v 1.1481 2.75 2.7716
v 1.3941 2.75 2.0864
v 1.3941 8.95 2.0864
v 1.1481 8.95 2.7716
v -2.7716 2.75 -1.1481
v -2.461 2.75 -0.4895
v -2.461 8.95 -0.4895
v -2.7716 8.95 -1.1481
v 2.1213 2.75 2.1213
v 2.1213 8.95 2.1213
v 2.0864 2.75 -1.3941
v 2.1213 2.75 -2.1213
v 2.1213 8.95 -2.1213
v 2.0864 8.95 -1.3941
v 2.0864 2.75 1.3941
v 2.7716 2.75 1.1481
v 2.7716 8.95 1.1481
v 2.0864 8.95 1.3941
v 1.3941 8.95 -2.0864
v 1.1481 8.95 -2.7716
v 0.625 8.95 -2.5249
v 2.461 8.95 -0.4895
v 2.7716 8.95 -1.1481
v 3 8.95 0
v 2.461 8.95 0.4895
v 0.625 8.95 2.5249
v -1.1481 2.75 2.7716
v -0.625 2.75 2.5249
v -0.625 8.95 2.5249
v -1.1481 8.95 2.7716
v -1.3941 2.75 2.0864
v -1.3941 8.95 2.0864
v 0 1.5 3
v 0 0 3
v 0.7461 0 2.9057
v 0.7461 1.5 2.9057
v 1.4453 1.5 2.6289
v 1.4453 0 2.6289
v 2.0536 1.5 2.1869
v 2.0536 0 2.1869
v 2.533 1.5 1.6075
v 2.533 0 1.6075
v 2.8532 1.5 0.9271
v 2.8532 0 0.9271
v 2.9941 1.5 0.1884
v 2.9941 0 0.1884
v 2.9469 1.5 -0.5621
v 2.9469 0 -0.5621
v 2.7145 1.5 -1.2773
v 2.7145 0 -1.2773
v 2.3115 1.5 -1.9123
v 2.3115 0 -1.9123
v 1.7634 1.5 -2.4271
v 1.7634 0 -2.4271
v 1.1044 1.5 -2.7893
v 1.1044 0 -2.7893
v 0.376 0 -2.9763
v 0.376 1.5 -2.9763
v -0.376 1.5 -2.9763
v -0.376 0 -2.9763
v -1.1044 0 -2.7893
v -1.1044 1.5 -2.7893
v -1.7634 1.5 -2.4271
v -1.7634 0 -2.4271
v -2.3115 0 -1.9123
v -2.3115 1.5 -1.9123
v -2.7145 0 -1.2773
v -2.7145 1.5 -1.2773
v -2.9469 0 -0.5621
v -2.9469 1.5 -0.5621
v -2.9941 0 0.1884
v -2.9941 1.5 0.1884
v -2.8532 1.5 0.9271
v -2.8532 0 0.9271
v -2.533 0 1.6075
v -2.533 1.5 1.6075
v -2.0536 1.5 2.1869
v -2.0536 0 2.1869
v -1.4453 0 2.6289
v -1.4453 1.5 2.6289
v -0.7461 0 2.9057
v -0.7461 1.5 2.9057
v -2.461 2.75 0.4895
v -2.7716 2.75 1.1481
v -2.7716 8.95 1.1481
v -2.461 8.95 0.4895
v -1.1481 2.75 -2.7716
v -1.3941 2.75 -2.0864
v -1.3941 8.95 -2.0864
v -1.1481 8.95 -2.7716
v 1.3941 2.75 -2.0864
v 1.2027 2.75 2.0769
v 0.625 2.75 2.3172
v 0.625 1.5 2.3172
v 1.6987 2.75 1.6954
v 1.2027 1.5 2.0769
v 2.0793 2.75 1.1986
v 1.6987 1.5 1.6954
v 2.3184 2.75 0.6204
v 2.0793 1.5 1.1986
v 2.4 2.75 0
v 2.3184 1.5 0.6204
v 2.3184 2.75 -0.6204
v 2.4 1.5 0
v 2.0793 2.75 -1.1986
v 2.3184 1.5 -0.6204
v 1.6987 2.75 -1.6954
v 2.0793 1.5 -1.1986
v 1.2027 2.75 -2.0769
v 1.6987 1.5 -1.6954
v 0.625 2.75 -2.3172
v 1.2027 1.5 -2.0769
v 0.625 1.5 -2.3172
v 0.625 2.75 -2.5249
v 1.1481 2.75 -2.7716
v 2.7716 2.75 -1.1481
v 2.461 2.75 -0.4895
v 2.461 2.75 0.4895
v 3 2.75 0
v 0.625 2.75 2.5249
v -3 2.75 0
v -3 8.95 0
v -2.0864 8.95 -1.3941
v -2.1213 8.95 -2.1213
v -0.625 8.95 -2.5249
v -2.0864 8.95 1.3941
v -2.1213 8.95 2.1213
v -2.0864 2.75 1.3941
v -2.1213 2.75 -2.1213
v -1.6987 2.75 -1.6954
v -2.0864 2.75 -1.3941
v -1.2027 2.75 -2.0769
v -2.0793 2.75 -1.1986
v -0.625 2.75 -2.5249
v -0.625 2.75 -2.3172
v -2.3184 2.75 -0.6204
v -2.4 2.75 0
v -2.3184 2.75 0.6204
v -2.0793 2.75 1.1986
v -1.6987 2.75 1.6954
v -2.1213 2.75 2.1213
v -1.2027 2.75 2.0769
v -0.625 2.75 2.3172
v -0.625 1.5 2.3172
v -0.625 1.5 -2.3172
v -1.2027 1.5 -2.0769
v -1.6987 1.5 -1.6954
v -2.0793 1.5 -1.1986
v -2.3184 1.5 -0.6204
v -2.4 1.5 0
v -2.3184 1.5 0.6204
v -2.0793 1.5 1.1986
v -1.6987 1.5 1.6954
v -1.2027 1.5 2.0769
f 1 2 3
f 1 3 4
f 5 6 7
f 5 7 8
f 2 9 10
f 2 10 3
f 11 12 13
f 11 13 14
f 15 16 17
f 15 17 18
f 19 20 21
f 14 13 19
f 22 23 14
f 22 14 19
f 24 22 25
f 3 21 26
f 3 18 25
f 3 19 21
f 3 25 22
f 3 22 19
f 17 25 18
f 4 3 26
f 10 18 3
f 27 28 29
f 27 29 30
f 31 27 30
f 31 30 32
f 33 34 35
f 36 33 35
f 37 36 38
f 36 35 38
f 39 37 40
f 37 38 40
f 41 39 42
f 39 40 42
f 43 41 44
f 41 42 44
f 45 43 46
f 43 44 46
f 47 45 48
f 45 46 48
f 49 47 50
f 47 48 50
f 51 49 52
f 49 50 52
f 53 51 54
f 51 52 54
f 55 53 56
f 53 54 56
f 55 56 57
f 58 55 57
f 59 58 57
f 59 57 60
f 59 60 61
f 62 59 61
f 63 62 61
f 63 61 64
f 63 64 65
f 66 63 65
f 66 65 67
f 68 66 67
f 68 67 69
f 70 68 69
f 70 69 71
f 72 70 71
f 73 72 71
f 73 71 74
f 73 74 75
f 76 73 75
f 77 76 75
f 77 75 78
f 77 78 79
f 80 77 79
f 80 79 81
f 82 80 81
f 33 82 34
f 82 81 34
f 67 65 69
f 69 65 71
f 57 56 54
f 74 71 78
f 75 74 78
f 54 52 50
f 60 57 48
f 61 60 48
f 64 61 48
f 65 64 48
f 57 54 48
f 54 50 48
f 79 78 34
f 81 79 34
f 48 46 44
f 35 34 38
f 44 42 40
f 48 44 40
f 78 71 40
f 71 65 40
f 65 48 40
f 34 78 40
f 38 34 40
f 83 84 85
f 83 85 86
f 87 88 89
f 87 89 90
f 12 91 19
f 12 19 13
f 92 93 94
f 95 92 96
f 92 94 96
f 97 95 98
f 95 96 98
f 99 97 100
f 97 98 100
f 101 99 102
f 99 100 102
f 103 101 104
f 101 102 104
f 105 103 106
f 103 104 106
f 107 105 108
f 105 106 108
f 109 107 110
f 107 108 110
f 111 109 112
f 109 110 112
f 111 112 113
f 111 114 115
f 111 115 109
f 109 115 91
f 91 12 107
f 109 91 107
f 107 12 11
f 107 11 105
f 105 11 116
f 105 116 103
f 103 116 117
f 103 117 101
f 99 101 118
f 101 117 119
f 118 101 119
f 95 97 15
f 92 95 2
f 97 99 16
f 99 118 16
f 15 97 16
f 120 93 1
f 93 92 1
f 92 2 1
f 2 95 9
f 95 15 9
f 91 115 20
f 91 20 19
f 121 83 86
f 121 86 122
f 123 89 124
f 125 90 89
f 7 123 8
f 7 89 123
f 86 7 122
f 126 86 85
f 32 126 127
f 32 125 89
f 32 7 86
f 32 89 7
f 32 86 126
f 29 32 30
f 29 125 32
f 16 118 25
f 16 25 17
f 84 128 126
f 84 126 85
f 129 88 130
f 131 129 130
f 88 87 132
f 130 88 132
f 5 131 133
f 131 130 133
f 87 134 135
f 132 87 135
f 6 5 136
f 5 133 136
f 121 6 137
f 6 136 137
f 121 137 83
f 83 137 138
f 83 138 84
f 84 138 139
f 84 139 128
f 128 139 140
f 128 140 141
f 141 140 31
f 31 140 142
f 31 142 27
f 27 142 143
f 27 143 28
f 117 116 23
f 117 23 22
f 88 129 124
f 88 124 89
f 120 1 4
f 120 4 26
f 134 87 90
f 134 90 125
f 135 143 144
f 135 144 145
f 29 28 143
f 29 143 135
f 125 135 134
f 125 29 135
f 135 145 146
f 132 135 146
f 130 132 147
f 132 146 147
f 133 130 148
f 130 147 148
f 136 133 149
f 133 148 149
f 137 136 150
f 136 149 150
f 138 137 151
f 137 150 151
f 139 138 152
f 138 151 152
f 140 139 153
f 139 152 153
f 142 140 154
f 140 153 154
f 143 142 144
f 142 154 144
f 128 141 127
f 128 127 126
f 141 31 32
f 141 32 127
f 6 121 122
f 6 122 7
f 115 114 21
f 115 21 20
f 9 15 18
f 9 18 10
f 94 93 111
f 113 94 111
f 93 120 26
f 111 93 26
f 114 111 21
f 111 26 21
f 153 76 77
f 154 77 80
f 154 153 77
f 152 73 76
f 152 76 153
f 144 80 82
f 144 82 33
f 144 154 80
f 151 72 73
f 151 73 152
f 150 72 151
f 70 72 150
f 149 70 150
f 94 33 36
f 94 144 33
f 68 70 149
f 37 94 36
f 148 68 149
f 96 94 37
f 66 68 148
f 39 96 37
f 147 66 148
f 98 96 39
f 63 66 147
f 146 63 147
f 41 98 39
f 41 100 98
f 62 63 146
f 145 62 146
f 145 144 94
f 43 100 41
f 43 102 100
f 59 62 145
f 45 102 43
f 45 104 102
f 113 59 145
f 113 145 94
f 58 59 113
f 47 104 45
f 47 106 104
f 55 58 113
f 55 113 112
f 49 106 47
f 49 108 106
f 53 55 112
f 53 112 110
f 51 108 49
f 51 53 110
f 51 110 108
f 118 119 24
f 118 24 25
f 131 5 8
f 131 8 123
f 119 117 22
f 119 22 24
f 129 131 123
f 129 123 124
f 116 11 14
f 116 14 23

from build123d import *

# Parameters (mm, degrees)
SKETCH1_R           = 3
BOSS_EXTRUDE1_DEPTH = 1.5
SKETCH2_R           = 2.4
BOSS_EXTRUDE2_DEPTH = 1.25
SKETCH4_R           = 3
BOSS_EXTRUDE3_DEPTH = 6.2
CUT_EXTRUDE1_START  = -6.2
CUT_EXTRUDE1_DEPTH  = 6.2
SKETCH6_W           = 1.25
SKETCH6_H           = 6
CUT_EXTRUDE2_DEPTH  = 7.45


with BuildPart() as part:
    # Sketch1 → Boss-Extrude1 (new body)
    with BuildSketch(Plane(origin=(0, 0, 0), x_dir=(1, 0, 0), z_dir=(0, 1, 0))):
        Circle(SKETCH1_R)
    extrude(amount=BOSS_EXTRUDE1_DEPTH)

    # Sketch2 → Boss-Extrude2 (add)
    with BuildSketch(Plane(origin=(0, 1.5, 0), x_dir=(1, 0, 0), z_dir=(0, 1, 0))):
        Circle(SKETCH2_R)
    extrude(amount=BOSS_EXTRUDE2_DEPTH)

    # Sketch4 → Boss-Extrude3 (add)
    with BuildSketch(Plane(origin=(0, 2.75, 0), x_dir=(1, 0, 0), z_dir=(0, 1, 0))):
        Circle(SKETCH4_R)
    extrude(amount=BOSS_EXTRUDE3_DEPTH)

    # Sketch5 → Cut-Extrude1 (cut)
    with BuildSketch(Plane(origin=(0, 8.95, 0), x_dir=(1, 0, 0), z_dir=(0, 1, 0)).offset(CUT_EXTRUDE1_START)):
        with BuildLine():
            ThreePointArc((2.771638598, -1.148050297), (2.942355841, -0.585270966), (3, 0))
            Line((3, 0), (2.461020315, -0.489527377))
            Line((2.461020315, -0.489527377), (2.771638598, -1.148050297))
        make_face()
        with BuildLine():
            Line((2.461020315, 0.489527377), (3, 0))
            ThreePointArc((3, 0), (2.942355841, 0.585270966), (2.771638598, 1.148050297))
            Line((2.771638598, 1.148050297), (2.461020315, 0.489527377))
        make_face()
        with BuildLine():
            Line((2.086352282, 1.394056026), (2.771638598, 1.148050297))
            ThreePointArc((2.771638598, 1.148050297), (2.494408837, 1.666710699), (2.121320344, 2.121320344))
            Line((2.121320344, 2.121320344), (2.086352282, 1.394056026))
        make_face()
        with BuildLine():
            ThreePointArc((2.121320344, -2.121320344), (2.494408837, -1.666710699), (2.771638598, -1.148050297))
            Line((2.771638598, -1.148050297), (2.086352282, -1.394056026))
            Line((2.086352282, -1.394056026), (2.121320344, -2.121320344))
        make_face()
        with BuildLine():
            Line((1.394056026, 2.086352282), (2.121320344, 2.121320344))
            ThreePointArc((2.121320344, 2.121320344), (1.666710699, 2.494408837), (1.148050297, 2.771638598))
            Line((1.148050297, 2.771638598), (1.394056026, 2.086352282))
        make_face()
        with BuildLine():
            ThreePointArc((1.148050297, -2.771638598), (1.666710699, -2.494408837), (2.121320344, -2.121320344))
            Line((2.121320344, -2.121320344), (1.394056026, -2.086352282))
            Line((1.394056026, -2.086352282), (1.148050297, -2.771638598))
        make_face()
        with BuildLine():
            Line((0.489527377, 2.461020315), (1.148050297, 2.771638598))
            ThreePointArc((1.148050297, 2.771638598), (0.585270966, 2.942355841), (0, 3))
            Line((0, 3), (0.489527377, 2.461020315))
        make_face()
        with BuildLine():
            ThreePointArc((0, -3), (0.585270966, -2.942355841), (1.148050297, -2.771638598))
            Line((1.148050297, -2.771638598), (0.489527377, -2.461020315))
            Line((0.489527377, -2.461020315), (0, -3))
        make_face()
        with BuildLine():
            Line((-0.489527377, 2.461020315), (0, 3))
            ThreePointArc((0, 3), (-0.585270966, 2.942355841), (-1.148050297, 2.771638598))
            Line((-1.148050297, 2.771638598), (-0.489527377, 2.461020315))
        make_face()
        with BuildLine():
            ThreePointArc((-1.148050297, -2.771638598), (-0.585270966, -2.942355841), (0, -3))
            Line((0, -3), (-0.489527377, -2.461020315))
            Line((-0.489527377, -2.461020315), (-1.148050297, -2.771638598))
        make_face()
        with BuildLine():
            Line((-1.394056026, 2.086352282), (-1.148050297, 2.771638598))
            ThreePointArc((-1.148050297, 2.771638598), (-1.666710699, 2.494408837), (-2.121320344, 2.121320344))
            Line((-2.121320344, 2.121320344), (-1.394056026, 2.086352282))
        make_face()
        with BuildLine():
            ThreePointArc((-2.121320344, -2.121320344), (-1.666710699, -2.494408837), (-1.148050297, -2.771638598))
            Line((-1.148050297, -2.771638598), (-1.394056026, -2.086352282))
            Line((-1.394056026, -2.086352282), (-2.121320344, -2.121320344))
        make_face()
        with BuildLine():
            Line((-2.086352282, 1.394056026), (-2.121320344, 2.121320344))
            ThreePointArc((-2.121320344, 2.121320344), (-2.494408837, 1.666710699), (-2.771638598, 1.148050297))
            Line((-2.771638598, 1.148050297), (-2.086352282, 1.394056026))
        make_face()
        with BuildLine():
            ThreePointArc((-2.771638598, -1.148050297), (-2.494408837, -1.666710699), (-2.121320344, -2.121320344))
            Line((-2.121320344, -2.121320344), (-2.086352282, -1.394056026))
            Line((-2.086352282, -1.394056026), (-2.771638598, -1.148050297))
        make_face()
        with BuildLine():
            Line((-2.461020315, 0.489527377), (-2.771638598, 1.148050297))
            ThreePointArc((-2.771638598, 1.148050297), (-2.942355841, 0.585270966), (-3, 0))
            Line((-3, 0), (-2.461020315, 0.489527377))
        make_face()
        with BuildLine():
            ThreePointArc((-3, 0), (-2.942355841, -0.585270966), (-2.771638598, -1.148050297))
            Line((-2.771638598, -1.148050297), (-2.461020315, -0.489527377))
            Line((-2.461020315, -0.489527377), (-3, 0))
        make_face()
    extrude(amount=CUT_EXTRUDE1_DEPTH, mode=Mode.SUBTRACT)

    # Sketch6 → Cut-Extrude2 (cut)
    with BuildSketch(Plane(origin=(0, 8.95, 0), x_dir=(1, 0, 0), z_dir=(0, 1, 0))):
        Rectangle(SKETCH6_W, SKETCH6_H)
    extrude(amount=-CUT_EXTRUDE2_DEPTH, mode=Mode.SUBTRACT)


solid = part.part
